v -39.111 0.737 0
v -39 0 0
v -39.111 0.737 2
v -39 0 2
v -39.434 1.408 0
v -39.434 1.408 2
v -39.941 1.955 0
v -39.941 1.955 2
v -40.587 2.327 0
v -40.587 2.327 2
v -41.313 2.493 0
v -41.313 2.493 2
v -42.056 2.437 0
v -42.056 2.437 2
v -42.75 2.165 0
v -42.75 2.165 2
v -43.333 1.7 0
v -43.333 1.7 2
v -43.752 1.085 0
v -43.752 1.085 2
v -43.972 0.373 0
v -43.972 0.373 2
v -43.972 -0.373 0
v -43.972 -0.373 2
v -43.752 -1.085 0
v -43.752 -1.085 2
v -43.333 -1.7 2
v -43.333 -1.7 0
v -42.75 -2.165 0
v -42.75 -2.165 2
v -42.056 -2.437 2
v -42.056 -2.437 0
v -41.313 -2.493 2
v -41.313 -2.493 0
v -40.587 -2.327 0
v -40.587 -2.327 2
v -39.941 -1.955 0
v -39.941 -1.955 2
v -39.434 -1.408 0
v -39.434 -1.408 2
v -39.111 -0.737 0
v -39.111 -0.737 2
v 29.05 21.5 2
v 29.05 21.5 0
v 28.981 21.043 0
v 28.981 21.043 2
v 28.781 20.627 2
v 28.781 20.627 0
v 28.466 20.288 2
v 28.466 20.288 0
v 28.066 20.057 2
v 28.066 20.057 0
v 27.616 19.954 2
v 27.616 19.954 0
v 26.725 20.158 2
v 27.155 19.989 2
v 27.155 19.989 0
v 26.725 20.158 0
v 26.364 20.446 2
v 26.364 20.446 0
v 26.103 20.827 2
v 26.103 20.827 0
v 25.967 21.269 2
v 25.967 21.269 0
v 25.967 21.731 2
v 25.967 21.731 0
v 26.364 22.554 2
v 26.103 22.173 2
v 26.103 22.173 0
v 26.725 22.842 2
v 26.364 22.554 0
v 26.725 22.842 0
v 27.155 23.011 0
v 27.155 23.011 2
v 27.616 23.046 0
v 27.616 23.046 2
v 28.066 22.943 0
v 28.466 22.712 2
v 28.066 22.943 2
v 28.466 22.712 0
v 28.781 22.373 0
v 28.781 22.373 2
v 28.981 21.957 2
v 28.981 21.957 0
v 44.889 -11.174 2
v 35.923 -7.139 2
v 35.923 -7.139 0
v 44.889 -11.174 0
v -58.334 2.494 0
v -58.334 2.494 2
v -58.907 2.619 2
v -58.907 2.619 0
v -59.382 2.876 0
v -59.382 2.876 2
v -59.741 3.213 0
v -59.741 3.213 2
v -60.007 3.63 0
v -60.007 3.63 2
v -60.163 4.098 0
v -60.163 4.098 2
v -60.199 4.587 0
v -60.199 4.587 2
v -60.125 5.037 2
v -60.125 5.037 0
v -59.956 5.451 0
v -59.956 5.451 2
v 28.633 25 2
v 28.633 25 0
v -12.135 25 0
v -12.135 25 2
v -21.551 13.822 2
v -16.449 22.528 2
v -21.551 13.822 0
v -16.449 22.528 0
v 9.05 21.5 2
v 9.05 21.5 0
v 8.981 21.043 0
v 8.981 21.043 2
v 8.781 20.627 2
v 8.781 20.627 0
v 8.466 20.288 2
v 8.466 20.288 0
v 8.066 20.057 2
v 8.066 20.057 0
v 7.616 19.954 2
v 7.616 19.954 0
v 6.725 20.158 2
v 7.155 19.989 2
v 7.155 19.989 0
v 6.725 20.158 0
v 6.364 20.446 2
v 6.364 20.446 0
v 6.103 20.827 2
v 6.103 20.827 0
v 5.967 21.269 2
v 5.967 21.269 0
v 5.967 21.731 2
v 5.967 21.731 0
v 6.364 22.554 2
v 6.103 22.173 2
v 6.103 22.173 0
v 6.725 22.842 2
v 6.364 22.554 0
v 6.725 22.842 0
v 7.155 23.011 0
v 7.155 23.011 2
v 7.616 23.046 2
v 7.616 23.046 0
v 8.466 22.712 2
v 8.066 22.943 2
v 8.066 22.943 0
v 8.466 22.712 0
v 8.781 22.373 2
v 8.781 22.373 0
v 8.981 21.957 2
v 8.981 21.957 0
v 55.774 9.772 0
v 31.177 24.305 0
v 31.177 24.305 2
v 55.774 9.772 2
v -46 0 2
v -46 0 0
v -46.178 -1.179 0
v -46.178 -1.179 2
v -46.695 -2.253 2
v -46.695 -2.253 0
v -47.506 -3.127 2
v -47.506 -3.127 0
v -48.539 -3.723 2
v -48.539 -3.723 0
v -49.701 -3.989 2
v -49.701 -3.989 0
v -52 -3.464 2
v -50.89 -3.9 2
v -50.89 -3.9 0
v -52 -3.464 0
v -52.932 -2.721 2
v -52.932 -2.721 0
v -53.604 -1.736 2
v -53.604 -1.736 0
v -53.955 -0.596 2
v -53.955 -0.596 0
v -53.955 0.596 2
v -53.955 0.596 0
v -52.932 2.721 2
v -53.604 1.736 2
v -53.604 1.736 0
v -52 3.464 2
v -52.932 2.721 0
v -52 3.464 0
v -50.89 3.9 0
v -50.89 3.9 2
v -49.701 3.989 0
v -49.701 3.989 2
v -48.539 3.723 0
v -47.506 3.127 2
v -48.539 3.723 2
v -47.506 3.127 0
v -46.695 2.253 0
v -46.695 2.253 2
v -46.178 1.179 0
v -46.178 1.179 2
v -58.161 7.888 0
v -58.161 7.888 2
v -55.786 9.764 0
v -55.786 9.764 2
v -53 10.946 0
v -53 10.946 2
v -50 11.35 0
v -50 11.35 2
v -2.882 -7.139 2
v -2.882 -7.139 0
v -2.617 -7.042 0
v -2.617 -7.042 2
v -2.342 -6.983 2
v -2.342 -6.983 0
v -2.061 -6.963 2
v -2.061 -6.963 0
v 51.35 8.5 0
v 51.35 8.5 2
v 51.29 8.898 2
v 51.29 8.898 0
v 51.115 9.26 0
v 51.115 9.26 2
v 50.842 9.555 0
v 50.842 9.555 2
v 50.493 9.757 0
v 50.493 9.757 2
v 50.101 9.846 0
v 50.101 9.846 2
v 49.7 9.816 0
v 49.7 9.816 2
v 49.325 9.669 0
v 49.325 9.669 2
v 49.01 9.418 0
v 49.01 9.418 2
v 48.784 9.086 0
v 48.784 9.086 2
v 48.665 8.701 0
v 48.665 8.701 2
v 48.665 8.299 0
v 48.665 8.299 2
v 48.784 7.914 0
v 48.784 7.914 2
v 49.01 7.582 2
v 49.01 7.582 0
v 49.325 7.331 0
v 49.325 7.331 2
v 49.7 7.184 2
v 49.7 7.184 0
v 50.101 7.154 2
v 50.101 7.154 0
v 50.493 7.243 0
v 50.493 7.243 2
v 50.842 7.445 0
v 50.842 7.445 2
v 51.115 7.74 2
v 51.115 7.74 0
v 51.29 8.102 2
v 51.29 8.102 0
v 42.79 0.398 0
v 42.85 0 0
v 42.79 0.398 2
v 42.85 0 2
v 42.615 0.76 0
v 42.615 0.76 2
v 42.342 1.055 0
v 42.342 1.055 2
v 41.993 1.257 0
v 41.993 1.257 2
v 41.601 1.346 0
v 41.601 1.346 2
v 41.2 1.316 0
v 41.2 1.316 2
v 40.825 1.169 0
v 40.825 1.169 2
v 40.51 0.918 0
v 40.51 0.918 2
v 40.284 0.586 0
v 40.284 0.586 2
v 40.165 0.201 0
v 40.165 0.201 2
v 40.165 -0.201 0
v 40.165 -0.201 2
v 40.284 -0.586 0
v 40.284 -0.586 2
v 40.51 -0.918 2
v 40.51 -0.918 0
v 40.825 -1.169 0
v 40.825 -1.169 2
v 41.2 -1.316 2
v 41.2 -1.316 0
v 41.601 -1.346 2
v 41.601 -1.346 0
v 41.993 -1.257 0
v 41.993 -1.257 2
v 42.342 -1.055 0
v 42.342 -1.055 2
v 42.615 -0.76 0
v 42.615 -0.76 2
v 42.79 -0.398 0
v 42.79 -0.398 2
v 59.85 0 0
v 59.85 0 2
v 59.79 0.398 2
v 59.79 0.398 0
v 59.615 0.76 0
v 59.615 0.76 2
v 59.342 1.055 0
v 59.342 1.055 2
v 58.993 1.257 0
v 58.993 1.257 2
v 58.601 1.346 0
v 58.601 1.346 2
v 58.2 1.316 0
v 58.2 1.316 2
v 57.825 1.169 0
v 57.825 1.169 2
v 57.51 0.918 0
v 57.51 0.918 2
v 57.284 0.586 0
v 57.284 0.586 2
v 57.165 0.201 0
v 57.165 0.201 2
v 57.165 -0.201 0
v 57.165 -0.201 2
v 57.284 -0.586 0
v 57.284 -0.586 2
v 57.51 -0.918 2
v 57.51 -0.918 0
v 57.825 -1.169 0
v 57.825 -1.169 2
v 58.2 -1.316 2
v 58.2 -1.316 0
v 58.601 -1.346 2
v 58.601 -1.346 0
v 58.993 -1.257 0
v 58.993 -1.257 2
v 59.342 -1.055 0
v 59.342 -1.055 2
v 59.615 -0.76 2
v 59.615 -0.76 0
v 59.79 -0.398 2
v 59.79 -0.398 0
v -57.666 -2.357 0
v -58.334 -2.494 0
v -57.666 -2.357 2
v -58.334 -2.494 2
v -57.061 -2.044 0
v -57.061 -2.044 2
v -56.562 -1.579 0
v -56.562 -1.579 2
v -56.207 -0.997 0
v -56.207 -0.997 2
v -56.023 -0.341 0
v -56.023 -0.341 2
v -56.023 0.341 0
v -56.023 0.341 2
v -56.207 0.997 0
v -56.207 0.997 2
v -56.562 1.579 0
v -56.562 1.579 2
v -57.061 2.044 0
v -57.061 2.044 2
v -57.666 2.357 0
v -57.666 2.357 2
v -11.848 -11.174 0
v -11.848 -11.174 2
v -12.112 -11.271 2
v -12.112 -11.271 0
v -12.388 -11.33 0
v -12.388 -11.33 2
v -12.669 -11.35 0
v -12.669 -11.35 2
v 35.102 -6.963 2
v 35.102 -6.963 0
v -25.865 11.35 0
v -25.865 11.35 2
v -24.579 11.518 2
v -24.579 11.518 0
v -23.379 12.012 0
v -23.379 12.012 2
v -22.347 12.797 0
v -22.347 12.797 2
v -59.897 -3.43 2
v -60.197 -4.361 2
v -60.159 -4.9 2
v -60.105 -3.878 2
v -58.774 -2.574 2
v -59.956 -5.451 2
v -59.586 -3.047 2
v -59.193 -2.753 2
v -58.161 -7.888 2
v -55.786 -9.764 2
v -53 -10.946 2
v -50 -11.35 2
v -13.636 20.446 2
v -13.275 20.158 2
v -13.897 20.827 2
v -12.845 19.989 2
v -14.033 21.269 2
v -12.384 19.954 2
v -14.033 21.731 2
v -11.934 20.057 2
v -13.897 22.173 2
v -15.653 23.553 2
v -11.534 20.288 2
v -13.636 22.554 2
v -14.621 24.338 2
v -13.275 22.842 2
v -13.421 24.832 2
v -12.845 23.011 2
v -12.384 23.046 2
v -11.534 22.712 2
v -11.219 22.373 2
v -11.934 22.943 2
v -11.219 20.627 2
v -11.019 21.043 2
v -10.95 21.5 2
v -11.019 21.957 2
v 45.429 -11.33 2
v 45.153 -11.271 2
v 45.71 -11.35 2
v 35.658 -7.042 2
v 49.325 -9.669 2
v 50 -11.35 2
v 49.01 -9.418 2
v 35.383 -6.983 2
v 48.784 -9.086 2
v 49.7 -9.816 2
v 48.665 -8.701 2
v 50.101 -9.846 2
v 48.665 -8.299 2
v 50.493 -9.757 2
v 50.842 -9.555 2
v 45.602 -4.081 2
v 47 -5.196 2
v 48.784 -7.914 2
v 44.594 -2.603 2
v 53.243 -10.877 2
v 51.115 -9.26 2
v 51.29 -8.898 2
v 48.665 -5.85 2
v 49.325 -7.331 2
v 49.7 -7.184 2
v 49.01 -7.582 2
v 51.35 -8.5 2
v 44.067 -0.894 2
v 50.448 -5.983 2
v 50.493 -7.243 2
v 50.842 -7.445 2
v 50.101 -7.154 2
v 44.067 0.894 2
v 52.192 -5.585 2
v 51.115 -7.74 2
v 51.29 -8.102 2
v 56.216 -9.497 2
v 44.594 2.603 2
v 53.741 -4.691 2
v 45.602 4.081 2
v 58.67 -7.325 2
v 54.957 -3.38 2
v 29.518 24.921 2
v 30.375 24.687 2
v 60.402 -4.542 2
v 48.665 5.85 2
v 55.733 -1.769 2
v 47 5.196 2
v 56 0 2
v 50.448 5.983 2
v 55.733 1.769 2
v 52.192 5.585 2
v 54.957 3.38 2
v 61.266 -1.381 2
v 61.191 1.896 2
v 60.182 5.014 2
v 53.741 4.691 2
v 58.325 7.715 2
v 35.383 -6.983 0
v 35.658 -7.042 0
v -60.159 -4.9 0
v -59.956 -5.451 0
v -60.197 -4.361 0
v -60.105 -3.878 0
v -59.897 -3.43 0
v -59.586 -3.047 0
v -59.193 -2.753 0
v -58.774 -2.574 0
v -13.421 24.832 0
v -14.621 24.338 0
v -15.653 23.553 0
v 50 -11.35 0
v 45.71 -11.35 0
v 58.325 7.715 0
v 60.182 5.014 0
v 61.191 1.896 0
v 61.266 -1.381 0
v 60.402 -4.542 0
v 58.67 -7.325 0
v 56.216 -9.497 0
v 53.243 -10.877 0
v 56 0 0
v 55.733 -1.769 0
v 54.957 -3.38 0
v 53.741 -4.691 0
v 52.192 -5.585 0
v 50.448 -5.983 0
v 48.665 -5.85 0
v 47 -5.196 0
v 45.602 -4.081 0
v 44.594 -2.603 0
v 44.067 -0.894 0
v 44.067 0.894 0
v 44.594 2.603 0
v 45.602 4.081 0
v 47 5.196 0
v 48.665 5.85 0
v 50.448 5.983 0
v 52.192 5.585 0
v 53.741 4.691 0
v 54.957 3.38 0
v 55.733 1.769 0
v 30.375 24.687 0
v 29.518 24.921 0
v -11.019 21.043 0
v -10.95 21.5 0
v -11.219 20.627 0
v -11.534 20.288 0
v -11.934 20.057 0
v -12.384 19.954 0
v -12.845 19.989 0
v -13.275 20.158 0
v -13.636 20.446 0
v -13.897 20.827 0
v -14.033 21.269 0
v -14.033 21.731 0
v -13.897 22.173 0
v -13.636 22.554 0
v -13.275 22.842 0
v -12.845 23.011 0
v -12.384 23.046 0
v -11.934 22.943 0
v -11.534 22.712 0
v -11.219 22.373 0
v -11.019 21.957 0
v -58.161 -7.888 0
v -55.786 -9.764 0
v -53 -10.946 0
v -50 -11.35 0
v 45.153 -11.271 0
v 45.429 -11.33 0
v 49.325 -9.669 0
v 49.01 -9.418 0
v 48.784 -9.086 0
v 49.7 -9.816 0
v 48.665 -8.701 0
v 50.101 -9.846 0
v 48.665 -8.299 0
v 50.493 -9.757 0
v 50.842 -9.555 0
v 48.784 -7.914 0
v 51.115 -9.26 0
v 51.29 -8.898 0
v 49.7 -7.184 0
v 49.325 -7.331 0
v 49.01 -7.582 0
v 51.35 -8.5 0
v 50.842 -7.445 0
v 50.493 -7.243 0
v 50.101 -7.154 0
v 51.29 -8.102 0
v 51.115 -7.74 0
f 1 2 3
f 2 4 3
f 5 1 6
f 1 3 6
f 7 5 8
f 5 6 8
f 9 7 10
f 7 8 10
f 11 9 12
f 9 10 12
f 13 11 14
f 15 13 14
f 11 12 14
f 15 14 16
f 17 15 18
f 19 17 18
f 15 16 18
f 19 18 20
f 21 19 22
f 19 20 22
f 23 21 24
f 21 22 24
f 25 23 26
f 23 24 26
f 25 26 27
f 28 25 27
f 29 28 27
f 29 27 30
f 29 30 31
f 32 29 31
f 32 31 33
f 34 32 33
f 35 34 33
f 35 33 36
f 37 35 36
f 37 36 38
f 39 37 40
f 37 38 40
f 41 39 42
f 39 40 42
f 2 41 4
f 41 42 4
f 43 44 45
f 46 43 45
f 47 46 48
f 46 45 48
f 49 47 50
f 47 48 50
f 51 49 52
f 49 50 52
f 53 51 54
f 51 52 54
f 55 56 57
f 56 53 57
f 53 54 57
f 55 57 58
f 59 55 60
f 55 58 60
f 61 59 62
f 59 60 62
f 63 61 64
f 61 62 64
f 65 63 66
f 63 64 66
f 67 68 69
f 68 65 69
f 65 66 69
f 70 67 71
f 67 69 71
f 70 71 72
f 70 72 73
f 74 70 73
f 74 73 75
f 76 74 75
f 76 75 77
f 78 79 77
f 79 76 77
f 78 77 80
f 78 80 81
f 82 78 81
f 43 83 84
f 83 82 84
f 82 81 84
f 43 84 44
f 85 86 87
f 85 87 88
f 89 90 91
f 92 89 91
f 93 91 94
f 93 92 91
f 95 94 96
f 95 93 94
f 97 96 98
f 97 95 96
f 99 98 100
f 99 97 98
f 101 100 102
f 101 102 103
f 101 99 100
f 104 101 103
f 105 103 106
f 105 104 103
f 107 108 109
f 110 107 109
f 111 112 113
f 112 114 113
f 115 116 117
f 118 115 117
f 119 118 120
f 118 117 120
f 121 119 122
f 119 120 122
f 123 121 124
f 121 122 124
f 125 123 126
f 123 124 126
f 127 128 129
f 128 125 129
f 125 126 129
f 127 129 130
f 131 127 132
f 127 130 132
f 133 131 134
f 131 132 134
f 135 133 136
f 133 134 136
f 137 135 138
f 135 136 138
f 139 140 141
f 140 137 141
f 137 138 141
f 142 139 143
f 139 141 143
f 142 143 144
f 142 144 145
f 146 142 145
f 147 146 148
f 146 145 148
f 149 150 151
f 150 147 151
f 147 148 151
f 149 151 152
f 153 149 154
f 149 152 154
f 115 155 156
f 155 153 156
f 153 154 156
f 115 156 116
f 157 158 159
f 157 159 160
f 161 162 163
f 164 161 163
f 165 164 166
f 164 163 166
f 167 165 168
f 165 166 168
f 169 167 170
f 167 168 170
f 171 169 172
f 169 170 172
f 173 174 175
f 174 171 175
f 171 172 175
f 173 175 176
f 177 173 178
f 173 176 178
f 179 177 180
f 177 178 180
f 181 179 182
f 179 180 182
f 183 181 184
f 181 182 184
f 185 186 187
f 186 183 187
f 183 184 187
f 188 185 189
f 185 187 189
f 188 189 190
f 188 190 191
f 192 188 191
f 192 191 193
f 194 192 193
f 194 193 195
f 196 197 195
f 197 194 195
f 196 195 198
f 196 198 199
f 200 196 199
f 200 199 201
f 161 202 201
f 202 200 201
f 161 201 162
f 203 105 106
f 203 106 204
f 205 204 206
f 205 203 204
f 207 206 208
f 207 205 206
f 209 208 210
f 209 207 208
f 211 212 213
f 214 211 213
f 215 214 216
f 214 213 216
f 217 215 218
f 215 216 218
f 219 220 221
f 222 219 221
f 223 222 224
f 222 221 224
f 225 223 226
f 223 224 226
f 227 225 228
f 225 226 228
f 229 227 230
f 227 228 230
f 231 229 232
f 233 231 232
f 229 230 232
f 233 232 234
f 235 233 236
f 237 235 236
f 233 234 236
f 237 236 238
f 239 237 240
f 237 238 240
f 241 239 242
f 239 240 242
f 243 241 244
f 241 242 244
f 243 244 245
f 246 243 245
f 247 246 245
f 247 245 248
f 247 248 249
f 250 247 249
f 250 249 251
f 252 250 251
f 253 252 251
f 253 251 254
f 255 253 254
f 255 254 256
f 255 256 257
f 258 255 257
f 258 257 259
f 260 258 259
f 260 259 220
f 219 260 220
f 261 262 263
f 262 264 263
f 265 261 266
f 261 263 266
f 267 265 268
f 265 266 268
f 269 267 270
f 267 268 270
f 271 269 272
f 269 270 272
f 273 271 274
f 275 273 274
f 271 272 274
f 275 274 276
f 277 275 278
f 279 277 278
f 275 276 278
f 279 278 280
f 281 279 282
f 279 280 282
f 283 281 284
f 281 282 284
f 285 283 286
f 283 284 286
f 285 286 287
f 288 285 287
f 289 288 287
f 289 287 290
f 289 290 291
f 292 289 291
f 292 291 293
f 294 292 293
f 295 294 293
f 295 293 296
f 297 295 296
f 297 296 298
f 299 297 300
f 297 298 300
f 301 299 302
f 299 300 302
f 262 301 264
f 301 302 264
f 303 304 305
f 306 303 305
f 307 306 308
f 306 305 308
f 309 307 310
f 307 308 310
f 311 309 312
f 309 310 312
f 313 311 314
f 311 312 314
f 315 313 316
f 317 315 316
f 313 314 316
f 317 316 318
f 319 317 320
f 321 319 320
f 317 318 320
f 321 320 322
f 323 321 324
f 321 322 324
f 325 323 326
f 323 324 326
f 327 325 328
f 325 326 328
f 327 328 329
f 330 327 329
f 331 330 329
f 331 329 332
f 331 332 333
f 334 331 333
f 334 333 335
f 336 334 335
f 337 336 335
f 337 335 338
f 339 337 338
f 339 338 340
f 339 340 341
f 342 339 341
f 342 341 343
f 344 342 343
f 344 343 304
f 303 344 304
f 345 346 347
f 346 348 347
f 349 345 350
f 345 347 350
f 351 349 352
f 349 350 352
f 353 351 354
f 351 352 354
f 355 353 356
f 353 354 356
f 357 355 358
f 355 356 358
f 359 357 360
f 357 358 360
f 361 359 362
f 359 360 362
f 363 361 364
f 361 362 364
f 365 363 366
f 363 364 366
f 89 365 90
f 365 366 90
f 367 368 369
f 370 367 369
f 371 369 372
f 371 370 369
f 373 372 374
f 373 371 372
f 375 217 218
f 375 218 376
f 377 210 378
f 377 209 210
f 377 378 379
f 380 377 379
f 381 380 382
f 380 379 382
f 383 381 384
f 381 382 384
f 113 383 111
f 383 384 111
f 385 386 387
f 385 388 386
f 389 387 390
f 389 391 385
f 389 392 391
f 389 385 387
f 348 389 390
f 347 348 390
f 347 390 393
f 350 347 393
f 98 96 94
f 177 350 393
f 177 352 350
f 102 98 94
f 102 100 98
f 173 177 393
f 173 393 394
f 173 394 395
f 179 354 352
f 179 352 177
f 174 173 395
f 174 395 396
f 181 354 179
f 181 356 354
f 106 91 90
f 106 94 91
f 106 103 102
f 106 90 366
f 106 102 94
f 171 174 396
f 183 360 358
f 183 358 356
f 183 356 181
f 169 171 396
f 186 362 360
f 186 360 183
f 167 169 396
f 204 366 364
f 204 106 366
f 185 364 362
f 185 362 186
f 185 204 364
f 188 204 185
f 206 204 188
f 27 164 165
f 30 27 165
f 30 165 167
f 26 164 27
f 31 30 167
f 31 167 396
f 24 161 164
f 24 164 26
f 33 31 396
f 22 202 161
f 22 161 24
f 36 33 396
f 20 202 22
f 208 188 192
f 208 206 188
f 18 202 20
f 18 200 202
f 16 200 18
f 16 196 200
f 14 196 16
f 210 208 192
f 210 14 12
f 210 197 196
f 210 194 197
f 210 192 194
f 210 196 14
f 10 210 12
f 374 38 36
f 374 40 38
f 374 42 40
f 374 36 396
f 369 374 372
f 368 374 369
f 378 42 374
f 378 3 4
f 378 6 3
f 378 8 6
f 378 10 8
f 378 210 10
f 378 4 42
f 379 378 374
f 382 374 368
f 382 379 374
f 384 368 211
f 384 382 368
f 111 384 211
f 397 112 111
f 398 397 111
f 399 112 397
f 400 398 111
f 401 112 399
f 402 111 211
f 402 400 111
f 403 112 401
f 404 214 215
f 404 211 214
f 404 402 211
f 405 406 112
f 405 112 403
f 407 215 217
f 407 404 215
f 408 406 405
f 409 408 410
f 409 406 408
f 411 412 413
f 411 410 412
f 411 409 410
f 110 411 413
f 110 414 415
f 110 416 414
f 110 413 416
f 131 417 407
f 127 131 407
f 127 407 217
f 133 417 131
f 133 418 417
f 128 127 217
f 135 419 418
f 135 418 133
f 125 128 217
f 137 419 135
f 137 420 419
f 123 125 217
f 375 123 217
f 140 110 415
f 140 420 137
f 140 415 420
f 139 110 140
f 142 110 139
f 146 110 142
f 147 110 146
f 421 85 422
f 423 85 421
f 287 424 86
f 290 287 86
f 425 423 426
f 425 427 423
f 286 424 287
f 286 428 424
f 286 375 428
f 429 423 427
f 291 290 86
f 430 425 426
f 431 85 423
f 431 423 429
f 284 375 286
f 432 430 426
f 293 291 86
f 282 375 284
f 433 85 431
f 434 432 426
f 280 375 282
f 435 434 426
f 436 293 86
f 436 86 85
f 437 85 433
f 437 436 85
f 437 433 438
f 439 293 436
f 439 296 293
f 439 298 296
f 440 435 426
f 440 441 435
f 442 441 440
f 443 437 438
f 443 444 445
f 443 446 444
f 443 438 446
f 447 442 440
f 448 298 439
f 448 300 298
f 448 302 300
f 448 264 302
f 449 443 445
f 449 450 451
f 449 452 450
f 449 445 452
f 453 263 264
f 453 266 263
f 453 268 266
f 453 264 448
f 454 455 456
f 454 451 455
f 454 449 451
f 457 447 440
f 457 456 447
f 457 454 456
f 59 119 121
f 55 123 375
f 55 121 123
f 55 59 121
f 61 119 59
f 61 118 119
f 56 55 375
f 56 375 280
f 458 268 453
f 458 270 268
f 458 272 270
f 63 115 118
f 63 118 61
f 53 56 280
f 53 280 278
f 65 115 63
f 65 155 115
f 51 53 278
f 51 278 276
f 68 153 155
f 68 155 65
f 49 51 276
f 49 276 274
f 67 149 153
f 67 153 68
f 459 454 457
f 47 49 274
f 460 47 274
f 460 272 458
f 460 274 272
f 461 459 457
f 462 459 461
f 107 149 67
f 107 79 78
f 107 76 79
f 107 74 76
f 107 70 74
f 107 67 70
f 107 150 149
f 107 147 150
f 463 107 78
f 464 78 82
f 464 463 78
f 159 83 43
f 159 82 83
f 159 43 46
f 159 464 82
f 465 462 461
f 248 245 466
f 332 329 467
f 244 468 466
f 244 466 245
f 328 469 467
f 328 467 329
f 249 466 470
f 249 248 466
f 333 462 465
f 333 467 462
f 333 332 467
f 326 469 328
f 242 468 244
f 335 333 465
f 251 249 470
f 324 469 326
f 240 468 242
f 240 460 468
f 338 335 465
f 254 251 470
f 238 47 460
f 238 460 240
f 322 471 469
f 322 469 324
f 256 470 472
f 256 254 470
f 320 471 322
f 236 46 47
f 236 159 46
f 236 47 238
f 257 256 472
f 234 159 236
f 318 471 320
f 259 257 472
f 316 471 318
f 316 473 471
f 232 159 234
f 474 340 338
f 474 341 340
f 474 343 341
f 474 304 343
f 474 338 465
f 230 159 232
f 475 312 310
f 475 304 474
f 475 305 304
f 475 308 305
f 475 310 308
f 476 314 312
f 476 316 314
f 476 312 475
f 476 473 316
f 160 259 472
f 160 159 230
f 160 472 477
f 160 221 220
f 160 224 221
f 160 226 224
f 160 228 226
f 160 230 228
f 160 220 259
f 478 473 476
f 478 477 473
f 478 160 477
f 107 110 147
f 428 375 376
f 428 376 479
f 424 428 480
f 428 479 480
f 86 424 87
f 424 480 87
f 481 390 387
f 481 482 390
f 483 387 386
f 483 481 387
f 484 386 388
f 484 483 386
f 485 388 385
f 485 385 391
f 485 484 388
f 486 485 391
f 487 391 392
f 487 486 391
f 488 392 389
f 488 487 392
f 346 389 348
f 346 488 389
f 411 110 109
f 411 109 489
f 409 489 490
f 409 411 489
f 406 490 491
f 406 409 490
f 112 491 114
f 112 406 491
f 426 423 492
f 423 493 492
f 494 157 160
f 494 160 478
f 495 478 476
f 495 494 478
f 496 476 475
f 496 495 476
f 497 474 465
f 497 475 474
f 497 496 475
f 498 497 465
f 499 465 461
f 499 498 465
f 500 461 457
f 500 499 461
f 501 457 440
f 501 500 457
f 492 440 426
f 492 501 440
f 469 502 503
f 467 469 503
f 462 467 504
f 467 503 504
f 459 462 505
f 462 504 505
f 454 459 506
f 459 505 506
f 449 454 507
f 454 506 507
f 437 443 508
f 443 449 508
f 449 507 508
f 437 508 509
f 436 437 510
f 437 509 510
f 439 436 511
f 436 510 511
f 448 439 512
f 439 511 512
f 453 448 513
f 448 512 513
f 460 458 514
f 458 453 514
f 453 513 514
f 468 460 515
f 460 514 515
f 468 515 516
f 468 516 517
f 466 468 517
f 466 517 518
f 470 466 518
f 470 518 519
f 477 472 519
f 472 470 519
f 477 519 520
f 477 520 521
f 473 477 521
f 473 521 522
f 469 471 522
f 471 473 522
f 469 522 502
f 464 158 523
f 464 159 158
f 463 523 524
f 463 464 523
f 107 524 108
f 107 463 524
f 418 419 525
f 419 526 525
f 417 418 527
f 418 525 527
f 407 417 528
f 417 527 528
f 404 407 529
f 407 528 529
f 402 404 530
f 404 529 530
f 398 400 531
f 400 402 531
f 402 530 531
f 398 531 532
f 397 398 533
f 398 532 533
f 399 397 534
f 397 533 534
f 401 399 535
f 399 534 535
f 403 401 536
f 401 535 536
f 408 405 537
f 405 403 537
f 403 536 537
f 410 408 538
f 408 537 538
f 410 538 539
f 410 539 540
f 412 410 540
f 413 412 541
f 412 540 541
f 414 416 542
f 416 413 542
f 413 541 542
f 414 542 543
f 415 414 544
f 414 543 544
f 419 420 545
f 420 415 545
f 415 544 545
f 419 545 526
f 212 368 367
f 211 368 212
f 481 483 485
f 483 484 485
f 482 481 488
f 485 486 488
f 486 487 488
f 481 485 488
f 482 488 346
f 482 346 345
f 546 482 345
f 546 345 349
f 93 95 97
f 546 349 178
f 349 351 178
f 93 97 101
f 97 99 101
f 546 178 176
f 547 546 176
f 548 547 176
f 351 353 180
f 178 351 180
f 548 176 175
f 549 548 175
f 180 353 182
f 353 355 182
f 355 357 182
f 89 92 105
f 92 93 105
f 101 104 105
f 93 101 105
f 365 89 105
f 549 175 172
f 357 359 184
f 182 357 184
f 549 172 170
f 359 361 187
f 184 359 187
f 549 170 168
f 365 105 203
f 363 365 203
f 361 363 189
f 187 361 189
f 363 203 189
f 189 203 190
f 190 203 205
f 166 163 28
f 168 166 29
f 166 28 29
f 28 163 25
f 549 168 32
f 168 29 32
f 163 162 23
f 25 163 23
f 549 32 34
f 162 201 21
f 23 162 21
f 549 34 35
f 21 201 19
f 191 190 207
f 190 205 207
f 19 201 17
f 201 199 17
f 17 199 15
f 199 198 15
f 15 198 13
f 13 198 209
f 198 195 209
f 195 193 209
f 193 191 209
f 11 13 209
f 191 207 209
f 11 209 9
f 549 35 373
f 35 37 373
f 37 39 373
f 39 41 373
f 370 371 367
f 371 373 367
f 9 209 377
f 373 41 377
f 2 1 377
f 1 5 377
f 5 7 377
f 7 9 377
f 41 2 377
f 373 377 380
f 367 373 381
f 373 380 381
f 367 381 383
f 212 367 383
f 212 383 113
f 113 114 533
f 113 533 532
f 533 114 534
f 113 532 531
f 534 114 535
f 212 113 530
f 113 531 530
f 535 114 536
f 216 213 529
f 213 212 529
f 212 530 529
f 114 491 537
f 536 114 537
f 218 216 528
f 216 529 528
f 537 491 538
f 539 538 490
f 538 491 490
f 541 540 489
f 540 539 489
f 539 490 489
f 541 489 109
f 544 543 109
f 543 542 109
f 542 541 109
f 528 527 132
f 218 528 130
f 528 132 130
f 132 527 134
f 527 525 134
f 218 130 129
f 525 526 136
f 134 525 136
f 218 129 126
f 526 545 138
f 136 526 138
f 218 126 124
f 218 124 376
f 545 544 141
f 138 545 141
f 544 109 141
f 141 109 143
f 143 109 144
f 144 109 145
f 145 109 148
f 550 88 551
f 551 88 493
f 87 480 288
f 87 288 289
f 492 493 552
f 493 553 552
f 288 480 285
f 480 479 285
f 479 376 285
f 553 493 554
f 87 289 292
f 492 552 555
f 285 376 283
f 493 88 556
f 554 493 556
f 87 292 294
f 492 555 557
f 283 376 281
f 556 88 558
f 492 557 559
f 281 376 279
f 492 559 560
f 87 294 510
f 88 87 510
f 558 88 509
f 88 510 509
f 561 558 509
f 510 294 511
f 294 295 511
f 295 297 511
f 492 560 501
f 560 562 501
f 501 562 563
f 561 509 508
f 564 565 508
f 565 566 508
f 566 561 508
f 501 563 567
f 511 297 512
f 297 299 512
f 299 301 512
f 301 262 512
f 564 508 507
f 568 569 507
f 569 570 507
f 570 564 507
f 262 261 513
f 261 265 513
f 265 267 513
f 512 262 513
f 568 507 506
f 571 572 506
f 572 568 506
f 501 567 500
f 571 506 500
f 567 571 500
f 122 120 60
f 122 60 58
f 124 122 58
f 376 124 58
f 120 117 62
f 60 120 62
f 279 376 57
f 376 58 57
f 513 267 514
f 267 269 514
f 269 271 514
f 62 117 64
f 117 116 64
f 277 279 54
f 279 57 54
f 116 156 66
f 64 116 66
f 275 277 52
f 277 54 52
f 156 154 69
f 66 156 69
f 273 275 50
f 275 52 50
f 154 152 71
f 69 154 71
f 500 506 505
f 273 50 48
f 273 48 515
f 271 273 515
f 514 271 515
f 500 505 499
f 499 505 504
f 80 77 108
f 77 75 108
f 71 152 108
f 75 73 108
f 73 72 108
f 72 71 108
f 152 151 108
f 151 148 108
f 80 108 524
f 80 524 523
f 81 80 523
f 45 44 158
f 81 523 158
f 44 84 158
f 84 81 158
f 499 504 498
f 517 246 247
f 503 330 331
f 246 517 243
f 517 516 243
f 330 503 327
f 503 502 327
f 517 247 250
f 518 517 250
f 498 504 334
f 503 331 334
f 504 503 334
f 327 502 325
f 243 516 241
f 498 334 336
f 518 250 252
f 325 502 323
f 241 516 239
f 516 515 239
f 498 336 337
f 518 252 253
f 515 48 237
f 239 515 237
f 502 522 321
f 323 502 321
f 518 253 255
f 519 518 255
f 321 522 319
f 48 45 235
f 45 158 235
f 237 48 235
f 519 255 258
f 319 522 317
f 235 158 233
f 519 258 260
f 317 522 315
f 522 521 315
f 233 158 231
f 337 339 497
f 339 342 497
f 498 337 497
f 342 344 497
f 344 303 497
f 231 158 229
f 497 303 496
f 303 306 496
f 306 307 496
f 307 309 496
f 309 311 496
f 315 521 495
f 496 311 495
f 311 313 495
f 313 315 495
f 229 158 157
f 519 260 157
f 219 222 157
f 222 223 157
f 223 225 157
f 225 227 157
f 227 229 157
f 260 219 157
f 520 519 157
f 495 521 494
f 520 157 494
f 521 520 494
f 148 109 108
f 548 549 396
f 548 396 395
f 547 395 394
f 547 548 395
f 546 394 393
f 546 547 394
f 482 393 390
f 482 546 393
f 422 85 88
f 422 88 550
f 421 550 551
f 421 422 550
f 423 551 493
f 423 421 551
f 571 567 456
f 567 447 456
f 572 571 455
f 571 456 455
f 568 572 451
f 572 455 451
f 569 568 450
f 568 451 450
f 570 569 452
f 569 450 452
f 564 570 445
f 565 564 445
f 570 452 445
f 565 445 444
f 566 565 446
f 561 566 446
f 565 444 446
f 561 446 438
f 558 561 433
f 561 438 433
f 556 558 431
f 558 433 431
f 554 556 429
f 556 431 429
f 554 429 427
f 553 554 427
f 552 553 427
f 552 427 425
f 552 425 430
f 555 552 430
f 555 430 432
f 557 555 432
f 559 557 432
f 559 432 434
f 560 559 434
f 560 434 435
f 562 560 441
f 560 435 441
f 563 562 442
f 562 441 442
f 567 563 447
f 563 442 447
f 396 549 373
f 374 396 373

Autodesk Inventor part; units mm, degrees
ref_plane "YZ Plane" through (0, 0, 0) normal (1, 0, 0) x (0, 1, 0)
ref_plane "XZ Plane" through (0, 0, 0) normal (0, 1, 0) x (-1, 0, 0)
ref_plane "XY Plane" through (0, 0, 0) normal (0, 0, 1) x (1, 0, 0)
sketch "スケッチ1" plane through (0, 0, 0) normal (0, 0, 1) x (1, 0, 0)
  line L0 (-50, 0) -> (50, 0) construction
  circle A0 centre (-50, 0) radius 4
  circle A1 centre (50, 0) radius 6
  line L1 (-50, 11.35) -> (-23, 11.35)
  line L2 (-50, -11.35) -> (50, -11.35)
  arc A2 (50, -11.35) -> (50, 11.35) centre (50, 0) ccw
  line L3 (30, 25) -> (-15, 25)
  line L4 (-15, 25) -> (-23, 11.35)
  line L5 (-19.1026, 18) -> (41.8474, 18) construction
  line L6 (-15, 25) -> (-15, 18) construction
  line L7 (30, 25) -> (30, 18) construction
  circle A3 centre (27.5, 21.5) radius 1.55
  circle A4 centre (-12.5, 21.5) radius 1.55
  circle A5 centre (7.5, 21.5) radius 1.55
  line L8 (-15, 21.5) -> (30, 21.5) construction
  line L9 (30, 24) -> (-15, 24) construction
  line L10 (-15, 24) -> (-15, 19) construction
  line L11 (-15, 19) -> (30, 19) construction
  line L12 (30, 19) -> (30, 24) construction
  line L13 (-23, 11.35) -> (50, 11.35)
  arc A6 (-50, 11.35) -> (-50, -11.35) centre (-50, 0) ccw
  line L14 (7.5, 25) -> (7.5, 18.5172) construction
  line L15 (30, 25) -> (55.7736, 9.7718)
  point P0 (0, 0)
  point P1 (0, 0)
  point P2 (55.7736, 9.7718)
  point P3 (38, 11.35)
  dimension "d0" = 100
  dimension "d1" = 8
  dimension "d8" = 12
  dimension "d10" = 7
  dimension "d11" = 45
  dimension "d12" = 2.5
  dimension "d13" = 3.1
  dimension "d14" = 2.5
  dimension "d15" = 20
  dimension "d17" = 5
  dimension "d18" = 19
  dimension "d69" = 11.35
  dimension "d72" = 11.35
  dimension "d87" = 8
  dimension "d88" = 8
extrude "押し出し1" add sketch "スケッチ1" along normal blind 2
fillet "フィレット1" radius 5 4 edges at (-23, 11.35, 1) (-15, 25, 1) (30, 25, 1) (-50, 11.35, 1)
sketch "スケッチ2" plane through (0, 0, 2) normal (0, 0, 1) x (1, 0, 0)
  arc A0 (50, -11.35) -> (55.7736, 9.7718) centre (50, 0) ccw projected
  line L0 (18, -20) -> (-35.4549, -20) construction
  line L1 (-76.9372, -11.5) -> (-72, -11.5)
  line L2 (-76.9372, -12.4) -> (-76.9372, -11.5)
  line L3 (-71.9872, -11.45) -> (-76.9872, -11.45)
  line L4 (-76.9872, -11.45) -> (-76.9872, -12.45)
  circle A1 centre (-50, 0) radius 4 projected
  circle A2 centre (-50, 0) radius 5.5 construction
  circle A3 centre (50, 0) radius 6 projected
  line L5 (83.3205, -17.7128) -> (50, 0) construction
  line L6 (50, 0) -> (18, -20) construction
  line L7 (83.3205, -17.7128) -> (37.8533, -17.7128) construction
  line L8 (-13.4166, -12.4128) -> (46.4577, -12.4128)
  line L9 (46.4577, -12.4128) -> (46.4577, -11.5128)
  line L10 (46.4577, -11.5128) -> (45.5205, -11.5128)
  line L11 (45.5205, -11.5128) -> (35.5205, -7.0128)
  line L12 (35.5205, -7.0128) -> (-2.4795, -7.0128)
  line L13 (-2.4795, -7.0128) -> (-12.4795, -11.5128)
  line L14 (-12.4795, -11.5128) -> (-13.4166, -11.5128)
  line L15 (-13.4166, -11.5128) -> (-13.4166, -12.4128)
  line L16 (-12.4902, -11.4628) -> (-2.4902, -6.9628)
  line L17 (-2.4902, -6.9628) -> (35.5312, -6.9628)
  line L18 (35.5312, -6.9628) -> (45.5312, -11.4628)
  line L19 (45.5312, -11.4628) -> (46.5077, -11.4628)
  line L20 (46.5077, -11.4628) -> (46.5077, -12.4628)
  line L21 (46.5077, -12.4628) -> (-13.4666, -12.4628)
  line L22 (-13.4666, -12.4628) -> (-13.4666, -11.4628)
  line L23 (-13.4666, -11.4628) -> (-12.4902, -11.4628)
  point P0 (56.6914, 9.1677)
  point P1 (0, 0)
  point P2 (50, 11.35)
  dimension "d19" = 20
  dimension "d20" = 32
  dimension "d32" = 11
  dimension "d33" = 120
  dimension "d37" = 37.8
  dimension "d38" = 6.2
  dimension "d39" = 0.05
  dimension "d49" = 38
  dimension "d50" = 10
  dimension "d51" = 10
  dimension "d52" = 4.5
  dimension "d53" = 0.9
  dimension "d54" = 59.9743
extrude "押し出し2" cut sketch "スケッチ2" against normal blind 10 contours L15 L14 L13 L12 L11 L10 L9 L8 | L16 L17 L18 L19 L20 L21 L22 L23
fillet "フィレット2" radius 2 4 edges at (45.2805, -11.35, 1) (-12.2395, -11.35, 1) (35.5312, -6.9628, 1) (-2.4902, -6.9628, 1)
sketch "スケッチ4" plane through (0, 0, 2) normal (0, 0, 1) x (1, 0, 0)
  circle A0 centre (50, 0) radius 6 projected
  circle A1 centre (50, 0) radius 8.5 construction
  line L0 (50, 0) -> (50, 8.5) construction
  circle A2 centre (50, 8.5) radius 1.35
  circle A3 centre (41.5, 0) radius 1.35
  circle A4 centre (50, -8.5) radius 1.35
  circle A5 centre (58.5, 0) radius 1.35
  point P0 (0, 0)
  dimension "d61" = 17
  dimension "d62" = 2.7
  dimension "d65" = 360
extrude "押し出し4" cut sketch "スケッチ4" against normal through all contours A2 | A3 | A4 | A5
sketch "スケッチ6" plane through (0, 0, 2) normal (0, 0, 1) x (1, 0, 0)
  circle A0 centre (-50, 0) radius 4 projected
  circle A1 centre (-50, 0) radius 8.5 construction
  circle A2 centre (-58.5, 0) radius 2.5
  line L0 (-50, 0) -> (-58.5, 0) construction
  line L1 (-50, 0) -> (-41.5, 0) construction
  circle A3 centre (-41.5, 0) radius 2.5
  arc A4 (-50, 11.35) -> (-50, -11.35) centre (-50, 0) ccw projected
  line L2 (-58.5, -2.5) -> (-61.0712, -2.5)
  line L3 (-58.5, 2.5) -> (-61.0712, 2.5)
  point P0 (0, 0)
  dimension "d78" = 17
  dimension "d79" = 5
  dimension "d82" = 360
extrude "押し出し6" cut sketch "スケッチ6" against normal through all contours A2 | A2 L2 A4 L3 | A3
fillet "フィレット4" radius 2 2 edges at (-61.0712, 2.5, 1) (-61.0712, -2.5, 1)
equation "\"d14\" = d12"
properties part number "Link_front_side_frame" material "GFRP"
